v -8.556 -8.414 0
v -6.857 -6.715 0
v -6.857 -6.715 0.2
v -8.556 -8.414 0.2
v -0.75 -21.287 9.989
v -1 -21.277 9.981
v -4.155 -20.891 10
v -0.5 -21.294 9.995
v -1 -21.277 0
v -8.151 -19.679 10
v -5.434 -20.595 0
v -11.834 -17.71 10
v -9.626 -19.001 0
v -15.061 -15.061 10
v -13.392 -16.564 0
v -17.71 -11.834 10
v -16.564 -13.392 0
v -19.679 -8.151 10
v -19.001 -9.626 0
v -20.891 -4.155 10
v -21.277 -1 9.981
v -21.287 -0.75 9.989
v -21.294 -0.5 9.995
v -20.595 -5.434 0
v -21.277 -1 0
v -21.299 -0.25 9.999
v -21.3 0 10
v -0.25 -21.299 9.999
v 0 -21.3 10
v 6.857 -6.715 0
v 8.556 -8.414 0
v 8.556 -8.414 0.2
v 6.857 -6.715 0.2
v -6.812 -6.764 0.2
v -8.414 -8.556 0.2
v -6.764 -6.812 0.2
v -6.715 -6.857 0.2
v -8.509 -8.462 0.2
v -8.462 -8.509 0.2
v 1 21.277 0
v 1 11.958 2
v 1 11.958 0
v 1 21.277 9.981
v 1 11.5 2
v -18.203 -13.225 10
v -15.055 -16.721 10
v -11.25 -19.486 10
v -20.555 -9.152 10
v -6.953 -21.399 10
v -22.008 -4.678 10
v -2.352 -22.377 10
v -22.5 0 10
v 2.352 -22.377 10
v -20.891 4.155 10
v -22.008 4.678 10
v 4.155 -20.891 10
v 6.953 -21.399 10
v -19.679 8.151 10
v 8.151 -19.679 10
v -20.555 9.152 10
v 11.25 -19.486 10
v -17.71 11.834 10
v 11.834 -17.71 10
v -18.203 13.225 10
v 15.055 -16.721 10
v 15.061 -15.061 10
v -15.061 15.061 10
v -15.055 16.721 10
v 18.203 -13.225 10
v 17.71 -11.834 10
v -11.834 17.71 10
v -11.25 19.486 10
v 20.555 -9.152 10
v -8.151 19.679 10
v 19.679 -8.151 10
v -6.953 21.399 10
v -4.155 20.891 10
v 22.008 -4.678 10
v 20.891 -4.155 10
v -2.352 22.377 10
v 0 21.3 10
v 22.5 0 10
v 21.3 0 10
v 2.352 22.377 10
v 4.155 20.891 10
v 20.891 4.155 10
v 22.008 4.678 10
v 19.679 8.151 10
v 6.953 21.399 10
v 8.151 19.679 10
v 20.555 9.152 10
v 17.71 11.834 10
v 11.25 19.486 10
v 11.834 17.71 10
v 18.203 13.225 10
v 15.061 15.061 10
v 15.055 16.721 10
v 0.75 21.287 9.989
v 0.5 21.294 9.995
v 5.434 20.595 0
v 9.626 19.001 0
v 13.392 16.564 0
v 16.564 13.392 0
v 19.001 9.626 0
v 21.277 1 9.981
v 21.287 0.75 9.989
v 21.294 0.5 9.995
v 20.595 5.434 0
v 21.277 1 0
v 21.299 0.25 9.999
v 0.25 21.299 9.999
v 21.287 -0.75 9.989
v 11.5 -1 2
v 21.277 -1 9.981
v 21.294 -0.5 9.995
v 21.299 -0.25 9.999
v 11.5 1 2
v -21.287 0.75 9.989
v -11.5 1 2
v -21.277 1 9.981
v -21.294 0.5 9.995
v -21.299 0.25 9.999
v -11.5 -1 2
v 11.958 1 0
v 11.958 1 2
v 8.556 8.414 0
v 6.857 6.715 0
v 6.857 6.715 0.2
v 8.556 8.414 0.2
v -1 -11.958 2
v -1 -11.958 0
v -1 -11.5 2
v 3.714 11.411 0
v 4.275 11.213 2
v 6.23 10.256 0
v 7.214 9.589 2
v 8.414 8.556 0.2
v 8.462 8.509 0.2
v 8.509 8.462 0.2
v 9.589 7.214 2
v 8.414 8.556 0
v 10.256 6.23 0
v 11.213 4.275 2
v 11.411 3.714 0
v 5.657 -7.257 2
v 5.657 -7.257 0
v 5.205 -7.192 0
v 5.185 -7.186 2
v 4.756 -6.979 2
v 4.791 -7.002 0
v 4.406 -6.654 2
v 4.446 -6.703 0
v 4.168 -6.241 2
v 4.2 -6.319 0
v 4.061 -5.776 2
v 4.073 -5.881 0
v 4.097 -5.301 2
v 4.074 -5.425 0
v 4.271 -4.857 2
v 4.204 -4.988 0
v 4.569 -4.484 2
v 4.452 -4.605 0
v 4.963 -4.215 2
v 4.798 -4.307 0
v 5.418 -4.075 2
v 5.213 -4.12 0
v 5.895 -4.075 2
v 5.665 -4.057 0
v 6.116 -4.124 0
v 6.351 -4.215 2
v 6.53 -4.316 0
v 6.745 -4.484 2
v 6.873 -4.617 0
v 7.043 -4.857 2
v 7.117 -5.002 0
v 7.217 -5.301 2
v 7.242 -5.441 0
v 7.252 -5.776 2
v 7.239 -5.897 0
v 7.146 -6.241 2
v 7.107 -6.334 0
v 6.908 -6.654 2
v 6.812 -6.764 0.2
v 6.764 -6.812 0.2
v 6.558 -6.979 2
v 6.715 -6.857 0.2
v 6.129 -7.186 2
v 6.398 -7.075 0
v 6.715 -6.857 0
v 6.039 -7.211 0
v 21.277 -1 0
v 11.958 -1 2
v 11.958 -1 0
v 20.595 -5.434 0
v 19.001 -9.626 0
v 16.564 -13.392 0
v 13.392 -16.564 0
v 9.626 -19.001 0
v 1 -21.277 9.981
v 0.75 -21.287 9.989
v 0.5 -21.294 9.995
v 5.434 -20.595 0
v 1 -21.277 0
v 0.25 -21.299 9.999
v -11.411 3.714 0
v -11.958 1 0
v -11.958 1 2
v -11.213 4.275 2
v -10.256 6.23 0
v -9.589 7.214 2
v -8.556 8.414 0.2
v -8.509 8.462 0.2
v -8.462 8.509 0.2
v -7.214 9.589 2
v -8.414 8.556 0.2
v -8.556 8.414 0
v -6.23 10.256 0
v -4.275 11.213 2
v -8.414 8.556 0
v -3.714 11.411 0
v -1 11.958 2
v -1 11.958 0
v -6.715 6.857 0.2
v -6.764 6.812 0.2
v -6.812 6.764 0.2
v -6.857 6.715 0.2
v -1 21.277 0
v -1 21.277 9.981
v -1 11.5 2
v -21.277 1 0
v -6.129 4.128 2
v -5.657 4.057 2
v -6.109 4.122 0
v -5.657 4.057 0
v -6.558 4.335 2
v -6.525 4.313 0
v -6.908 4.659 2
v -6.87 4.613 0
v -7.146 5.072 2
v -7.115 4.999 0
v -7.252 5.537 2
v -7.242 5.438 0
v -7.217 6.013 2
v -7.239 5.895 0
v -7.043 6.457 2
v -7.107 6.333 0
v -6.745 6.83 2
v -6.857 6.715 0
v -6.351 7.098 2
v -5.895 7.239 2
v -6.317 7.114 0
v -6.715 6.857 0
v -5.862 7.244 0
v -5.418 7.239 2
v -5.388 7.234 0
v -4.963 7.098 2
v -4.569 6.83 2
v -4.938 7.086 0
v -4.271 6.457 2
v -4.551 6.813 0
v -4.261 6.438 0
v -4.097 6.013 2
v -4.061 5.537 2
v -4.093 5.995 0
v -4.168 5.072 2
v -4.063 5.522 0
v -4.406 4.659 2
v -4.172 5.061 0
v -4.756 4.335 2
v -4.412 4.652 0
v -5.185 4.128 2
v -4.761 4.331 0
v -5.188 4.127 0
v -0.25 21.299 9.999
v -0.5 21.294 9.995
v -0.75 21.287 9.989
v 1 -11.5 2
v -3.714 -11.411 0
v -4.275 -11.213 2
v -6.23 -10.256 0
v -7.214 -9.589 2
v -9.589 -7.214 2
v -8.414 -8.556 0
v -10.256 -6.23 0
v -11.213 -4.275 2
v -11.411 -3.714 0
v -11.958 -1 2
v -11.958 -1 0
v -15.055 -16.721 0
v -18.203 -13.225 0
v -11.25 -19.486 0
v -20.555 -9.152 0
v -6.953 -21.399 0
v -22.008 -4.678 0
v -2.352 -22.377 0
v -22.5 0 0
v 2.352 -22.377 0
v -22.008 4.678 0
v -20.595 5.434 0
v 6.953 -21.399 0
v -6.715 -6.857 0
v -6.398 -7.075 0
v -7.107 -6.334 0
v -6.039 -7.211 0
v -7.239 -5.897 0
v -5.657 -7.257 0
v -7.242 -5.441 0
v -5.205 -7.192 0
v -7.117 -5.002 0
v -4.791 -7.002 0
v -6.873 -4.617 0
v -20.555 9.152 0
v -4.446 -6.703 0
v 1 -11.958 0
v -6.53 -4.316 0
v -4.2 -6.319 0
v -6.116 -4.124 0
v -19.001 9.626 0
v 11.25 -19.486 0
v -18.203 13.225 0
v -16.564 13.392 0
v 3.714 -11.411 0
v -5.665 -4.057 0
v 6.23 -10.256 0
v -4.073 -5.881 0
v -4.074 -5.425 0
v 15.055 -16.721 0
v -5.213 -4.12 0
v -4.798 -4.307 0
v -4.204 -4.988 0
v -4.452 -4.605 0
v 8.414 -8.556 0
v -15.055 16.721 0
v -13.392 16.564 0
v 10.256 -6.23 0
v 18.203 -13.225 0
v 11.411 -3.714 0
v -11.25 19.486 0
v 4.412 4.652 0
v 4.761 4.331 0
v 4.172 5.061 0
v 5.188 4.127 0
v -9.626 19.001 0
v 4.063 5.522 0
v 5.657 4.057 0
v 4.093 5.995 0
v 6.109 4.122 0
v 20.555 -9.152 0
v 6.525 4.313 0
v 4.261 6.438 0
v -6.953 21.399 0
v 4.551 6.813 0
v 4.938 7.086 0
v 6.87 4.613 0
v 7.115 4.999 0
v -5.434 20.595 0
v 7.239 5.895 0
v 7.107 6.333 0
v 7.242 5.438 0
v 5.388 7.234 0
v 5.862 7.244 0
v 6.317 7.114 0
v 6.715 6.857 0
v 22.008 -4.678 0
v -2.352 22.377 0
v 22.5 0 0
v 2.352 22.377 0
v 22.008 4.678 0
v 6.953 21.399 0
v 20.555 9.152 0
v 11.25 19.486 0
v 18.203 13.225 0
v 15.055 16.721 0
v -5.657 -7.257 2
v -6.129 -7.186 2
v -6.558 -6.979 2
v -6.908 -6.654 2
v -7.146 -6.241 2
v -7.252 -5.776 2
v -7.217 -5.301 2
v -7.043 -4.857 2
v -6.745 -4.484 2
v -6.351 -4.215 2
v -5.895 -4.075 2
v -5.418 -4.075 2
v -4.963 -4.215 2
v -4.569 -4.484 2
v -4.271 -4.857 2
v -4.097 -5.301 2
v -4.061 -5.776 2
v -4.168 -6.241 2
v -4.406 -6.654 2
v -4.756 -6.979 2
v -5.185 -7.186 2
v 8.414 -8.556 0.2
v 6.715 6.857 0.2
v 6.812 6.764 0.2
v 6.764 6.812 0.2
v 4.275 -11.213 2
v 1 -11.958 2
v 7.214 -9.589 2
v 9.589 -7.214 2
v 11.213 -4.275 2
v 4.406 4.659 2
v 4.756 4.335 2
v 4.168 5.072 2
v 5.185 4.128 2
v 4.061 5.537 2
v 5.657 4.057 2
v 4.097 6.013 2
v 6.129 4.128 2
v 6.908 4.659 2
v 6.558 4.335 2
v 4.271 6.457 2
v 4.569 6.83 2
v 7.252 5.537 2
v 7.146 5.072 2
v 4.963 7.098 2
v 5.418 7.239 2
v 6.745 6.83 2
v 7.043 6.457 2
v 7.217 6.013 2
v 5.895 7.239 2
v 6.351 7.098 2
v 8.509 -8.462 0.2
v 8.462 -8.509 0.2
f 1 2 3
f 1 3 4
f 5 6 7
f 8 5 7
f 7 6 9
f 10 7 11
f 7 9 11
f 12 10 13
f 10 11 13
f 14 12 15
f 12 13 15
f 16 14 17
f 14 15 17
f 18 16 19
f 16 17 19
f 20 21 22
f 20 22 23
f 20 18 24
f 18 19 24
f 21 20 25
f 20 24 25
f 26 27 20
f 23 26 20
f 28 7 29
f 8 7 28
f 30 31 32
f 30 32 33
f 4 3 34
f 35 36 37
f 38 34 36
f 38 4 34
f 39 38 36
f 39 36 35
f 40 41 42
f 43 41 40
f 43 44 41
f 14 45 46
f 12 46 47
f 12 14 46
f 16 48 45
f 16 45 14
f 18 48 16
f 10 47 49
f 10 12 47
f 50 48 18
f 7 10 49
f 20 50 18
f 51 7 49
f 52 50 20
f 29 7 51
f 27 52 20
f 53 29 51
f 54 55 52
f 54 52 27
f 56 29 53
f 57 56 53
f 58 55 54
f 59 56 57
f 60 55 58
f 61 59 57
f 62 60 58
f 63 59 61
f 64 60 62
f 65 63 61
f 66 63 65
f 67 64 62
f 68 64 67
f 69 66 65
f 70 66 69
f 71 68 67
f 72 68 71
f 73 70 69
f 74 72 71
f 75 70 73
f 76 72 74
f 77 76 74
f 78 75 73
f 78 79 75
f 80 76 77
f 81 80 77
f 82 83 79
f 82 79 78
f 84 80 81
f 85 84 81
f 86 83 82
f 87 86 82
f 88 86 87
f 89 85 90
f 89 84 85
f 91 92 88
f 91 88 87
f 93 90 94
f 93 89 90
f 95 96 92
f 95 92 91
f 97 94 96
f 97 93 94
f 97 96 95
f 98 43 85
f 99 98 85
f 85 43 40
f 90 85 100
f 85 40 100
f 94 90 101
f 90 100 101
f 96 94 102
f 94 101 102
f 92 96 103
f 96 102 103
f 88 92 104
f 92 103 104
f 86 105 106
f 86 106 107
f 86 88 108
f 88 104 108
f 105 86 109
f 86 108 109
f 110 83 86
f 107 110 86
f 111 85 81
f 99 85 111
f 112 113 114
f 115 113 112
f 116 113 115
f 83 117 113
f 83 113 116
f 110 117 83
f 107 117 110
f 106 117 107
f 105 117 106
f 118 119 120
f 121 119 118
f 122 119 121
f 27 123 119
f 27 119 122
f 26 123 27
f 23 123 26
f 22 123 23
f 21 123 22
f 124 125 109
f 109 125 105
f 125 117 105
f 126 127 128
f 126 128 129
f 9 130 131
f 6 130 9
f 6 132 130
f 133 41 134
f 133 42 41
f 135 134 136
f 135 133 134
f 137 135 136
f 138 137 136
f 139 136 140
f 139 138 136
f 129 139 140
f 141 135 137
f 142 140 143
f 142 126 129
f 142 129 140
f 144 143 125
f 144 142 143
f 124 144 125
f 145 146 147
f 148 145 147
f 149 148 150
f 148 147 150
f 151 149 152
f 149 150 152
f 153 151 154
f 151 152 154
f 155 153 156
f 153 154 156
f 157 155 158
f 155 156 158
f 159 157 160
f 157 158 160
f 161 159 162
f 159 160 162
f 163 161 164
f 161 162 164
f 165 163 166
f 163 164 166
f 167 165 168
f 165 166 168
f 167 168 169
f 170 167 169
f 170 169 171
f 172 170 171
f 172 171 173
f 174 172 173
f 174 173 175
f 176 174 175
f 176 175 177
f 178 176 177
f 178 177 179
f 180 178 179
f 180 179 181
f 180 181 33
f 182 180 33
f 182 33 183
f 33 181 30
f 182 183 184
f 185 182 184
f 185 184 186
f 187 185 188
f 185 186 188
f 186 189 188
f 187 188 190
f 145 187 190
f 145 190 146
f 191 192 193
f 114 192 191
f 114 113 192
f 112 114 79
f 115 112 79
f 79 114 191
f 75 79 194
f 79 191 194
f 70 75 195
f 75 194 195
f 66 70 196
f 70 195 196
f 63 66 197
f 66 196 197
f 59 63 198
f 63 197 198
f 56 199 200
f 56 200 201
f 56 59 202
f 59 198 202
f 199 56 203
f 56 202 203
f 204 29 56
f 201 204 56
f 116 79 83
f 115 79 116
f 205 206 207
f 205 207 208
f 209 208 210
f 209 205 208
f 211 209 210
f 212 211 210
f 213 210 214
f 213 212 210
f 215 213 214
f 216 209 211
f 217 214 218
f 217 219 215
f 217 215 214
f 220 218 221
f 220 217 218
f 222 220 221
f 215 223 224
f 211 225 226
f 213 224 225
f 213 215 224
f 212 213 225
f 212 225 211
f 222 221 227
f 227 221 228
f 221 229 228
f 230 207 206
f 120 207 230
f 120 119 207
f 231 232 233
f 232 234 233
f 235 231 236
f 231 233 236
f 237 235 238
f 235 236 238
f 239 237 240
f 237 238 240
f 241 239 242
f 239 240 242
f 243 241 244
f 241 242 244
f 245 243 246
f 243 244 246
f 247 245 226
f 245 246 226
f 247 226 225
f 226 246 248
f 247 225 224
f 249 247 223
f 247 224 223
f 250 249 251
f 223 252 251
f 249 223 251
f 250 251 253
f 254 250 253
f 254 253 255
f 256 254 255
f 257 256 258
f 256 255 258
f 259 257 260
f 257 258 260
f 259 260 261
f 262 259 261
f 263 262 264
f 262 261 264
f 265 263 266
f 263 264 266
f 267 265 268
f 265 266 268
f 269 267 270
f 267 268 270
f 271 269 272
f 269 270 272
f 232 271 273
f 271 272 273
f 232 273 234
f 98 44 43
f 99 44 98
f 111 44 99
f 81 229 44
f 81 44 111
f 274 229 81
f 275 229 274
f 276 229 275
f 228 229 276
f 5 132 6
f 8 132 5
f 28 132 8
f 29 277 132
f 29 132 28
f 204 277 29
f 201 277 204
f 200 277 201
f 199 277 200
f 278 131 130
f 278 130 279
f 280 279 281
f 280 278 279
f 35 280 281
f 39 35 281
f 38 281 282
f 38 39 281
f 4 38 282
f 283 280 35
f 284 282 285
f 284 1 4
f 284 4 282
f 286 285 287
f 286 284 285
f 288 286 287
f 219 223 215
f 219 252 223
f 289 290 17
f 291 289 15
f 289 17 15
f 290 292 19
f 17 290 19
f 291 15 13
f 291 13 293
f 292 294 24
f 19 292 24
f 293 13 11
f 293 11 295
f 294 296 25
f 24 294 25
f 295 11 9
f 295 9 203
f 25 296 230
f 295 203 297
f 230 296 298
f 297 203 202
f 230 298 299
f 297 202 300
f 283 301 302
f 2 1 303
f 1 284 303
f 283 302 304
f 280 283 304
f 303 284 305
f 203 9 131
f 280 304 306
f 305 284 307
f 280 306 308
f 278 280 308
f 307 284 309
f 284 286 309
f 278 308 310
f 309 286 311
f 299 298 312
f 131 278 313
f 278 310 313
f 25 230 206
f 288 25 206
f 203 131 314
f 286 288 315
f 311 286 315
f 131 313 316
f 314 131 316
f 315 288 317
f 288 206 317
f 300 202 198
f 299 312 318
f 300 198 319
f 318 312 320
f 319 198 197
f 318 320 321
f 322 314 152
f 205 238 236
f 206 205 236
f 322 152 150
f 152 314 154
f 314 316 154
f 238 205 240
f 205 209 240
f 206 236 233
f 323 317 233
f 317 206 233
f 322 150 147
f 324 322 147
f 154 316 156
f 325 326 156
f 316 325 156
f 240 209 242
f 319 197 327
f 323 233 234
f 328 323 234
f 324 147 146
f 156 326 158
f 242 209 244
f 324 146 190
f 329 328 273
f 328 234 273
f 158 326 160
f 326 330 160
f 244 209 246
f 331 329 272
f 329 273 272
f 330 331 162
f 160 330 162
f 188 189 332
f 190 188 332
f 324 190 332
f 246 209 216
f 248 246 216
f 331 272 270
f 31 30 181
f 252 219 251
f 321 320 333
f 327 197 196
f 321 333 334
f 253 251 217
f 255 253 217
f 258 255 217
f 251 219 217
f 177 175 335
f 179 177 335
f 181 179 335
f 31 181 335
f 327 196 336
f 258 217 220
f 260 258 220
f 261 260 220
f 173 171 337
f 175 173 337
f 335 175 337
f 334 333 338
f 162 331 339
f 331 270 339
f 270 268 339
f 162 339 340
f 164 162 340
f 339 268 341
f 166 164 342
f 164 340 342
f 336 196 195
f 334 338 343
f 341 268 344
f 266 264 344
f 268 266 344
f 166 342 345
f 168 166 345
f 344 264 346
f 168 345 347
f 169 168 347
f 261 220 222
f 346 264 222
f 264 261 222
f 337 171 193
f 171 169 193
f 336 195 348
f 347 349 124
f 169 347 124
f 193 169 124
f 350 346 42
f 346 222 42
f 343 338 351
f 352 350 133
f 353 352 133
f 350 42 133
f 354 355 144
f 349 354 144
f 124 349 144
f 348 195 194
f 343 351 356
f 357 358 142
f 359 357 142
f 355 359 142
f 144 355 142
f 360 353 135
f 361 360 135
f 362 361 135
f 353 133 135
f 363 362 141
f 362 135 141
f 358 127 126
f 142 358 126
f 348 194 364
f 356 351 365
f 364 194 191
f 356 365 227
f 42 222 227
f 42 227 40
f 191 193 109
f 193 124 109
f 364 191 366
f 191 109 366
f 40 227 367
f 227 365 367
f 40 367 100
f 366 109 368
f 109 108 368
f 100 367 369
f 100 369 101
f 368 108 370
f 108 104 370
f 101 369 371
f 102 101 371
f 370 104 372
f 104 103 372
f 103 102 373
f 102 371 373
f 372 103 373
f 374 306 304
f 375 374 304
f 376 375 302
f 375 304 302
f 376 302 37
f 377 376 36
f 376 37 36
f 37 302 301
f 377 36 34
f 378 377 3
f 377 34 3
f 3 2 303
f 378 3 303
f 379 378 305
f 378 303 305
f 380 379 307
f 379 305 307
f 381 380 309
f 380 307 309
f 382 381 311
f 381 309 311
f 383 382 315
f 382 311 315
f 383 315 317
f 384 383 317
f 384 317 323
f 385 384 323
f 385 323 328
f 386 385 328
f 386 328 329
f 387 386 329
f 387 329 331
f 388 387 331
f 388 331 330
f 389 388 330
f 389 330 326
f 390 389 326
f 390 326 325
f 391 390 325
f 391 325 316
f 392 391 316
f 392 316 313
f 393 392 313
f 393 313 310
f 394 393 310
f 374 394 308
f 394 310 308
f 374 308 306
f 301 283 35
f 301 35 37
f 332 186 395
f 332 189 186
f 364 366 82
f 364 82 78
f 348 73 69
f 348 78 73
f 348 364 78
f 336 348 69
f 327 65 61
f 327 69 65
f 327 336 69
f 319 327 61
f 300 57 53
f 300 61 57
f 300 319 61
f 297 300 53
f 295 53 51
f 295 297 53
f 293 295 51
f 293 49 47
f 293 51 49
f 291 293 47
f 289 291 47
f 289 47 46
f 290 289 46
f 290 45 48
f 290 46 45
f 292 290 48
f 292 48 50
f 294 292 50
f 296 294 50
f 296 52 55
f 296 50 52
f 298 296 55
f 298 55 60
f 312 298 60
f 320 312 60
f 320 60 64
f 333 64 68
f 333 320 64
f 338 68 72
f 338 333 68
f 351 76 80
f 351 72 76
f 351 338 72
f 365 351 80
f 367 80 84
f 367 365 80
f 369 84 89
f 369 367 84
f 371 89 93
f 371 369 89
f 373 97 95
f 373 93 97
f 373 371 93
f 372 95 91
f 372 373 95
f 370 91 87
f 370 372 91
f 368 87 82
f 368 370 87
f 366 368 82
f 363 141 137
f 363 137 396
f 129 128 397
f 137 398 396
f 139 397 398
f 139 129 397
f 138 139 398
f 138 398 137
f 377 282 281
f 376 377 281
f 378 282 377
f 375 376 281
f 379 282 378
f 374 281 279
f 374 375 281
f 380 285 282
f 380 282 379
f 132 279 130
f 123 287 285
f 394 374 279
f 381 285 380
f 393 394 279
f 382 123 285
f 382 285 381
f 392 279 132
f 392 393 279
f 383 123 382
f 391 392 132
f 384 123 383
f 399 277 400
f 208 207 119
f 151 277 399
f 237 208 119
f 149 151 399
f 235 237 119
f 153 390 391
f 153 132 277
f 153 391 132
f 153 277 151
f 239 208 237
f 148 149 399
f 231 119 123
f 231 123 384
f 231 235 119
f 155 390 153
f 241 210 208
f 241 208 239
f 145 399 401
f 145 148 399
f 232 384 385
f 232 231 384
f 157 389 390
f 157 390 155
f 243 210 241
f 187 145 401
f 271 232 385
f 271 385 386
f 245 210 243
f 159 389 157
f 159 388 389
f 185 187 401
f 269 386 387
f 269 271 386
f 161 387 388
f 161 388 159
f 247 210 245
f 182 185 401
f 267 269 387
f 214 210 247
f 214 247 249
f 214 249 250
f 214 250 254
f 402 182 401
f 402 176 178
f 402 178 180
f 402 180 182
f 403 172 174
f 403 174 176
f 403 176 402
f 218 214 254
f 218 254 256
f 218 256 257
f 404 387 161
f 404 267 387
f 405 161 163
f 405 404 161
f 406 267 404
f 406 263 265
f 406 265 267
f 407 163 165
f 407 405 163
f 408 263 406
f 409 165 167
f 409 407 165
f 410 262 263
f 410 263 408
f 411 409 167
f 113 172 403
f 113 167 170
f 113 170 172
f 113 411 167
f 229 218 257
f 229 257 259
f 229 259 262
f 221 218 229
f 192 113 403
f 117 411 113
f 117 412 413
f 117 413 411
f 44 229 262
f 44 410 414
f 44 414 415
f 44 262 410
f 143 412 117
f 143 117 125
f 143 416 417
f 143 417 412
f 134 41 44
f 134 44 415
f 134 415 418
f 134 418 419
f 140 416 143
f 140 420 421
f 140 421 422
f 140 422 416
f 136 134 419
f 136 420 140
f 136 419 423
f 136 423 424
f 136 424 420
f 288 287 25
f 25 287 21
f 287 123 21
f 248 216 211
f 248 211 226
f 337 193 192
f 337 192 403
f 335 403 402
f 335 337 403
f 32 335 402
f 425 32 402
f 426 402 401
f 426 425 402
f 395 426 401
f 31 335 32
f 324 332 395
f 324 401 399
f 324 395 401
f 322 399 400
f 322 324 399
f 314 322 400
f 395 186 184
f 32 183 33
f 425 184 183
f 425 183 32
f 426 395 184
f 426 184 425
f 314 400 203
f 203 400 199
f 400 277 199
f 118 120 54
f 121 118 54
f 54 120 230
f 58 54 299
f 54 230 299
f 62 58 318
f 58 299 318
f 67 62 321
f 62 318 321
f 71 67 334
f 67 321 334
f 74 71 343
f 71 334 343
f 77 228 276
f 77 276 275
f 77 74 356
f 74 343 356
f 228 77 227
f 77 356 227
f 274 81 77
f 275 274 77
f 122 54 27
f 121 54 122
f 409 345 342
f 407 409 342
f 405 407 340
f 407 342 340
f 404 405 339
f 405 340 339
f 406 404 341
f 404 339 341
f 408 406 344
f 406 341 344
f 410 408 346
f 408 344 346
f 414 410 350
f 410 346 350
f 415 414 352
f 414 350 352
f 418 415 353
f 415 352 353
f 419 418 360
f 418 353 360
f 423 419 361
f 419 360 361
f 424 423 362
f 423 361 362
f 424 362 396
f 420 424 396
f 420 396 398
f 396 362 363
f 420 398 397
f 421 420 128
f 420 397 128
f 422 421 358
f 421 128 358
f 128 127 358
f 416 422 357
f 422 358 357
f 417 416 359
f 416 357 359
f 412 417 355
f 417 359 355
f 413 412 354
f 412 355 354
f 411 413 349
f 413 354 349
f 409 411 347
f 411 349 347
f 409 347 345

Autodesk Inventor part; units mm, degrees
ref_plane "YZ Plane" through (0, 0, 0) normal (1, 0, 0) x (0, 1, 0)
ref_plane "XZ Plane" through (0, 0, 0) normal (0, 1, 0) x (-1, 0, 0)
ref_plane "XY Plane" through (0, 0, 0) normal (0, 0, 1) x (1, 0, 0)
sketch "スケッチ1" plane through (0, 0, 0) normal (0, 0, 1) x (1, 0, 0)
  circle A0 centre (0, 0) radius 12
  dimension "HUB_DIA" = 24
extrude "ハブ" add sketch "スケッチ1" along normal blind 2
sketch "スケッチ2" plane through (0, 0, 0) normal (0, 0, 1) x (1, 0, 0)
  circle A0 centre (0, 0) radius 22.5
  circle A1 centre (0, 0) radius 21.3
  dimension "DIA" = 45
  dimension "RIM_THIN" = 1.2
extrude "リム" add sketch "スケッチ2" along normal blind 10
sketch "スケッチ5" plane through (0, 0, 0) normal (1, 0, 0) x (0, 1, 0)
  line L0 (21.3, 10) -> (21.3, 0) projected
  line L1 (21.3, 10) -> (21.3, 0)
  line L2 (21.3, 0) -> (11.5, 0)
  line L3 (22.5, 0) -> (-22.5, 0) projected
  line L4 (11.5, 0) -> (11.5, 2)
  line L5 (11.5, 2) -> (21.3, 10)
  line L6 (12, 2) -> (-12, 2) projected
  point P0 (0, 0)
  point P1 (0, 0)
  dimension "d10" = 11.5
extrude "スポーク" add sketch "スケッチ5" along normal mid plane 2
pattern_circular "円形状パターン1" count 4 over 360 about axis through (0, 0, -10) along (0, 0, 1) of "スポーク"
sketch "スケッチ6" plane through (0, 0, 2) normal (0, 0, 1) x (1, 0, 0)
  circle A0 centre (0, 0) radius 8 construction
  line L0 (-13.4189, -13.4189) -> (13.4189, 13.4189) construction
  line L1 (-15.0493, 15.0493) -> (15.0493, -15.0493) construction
  line L2 (-16.6434, 0) -> (16.6434, 0) construction
  point P0 (5.6569, 5.6569)
  point P1 (-5.6569, 5.6569)
  point P2 (-5.6569, -5.6569)
  point P3 (5.6569, -5.6569)
  dimension "d16" = 16
  dimension "d17" = 45
  dimension "d18" = 45
hole "フランジ取付穴" at (5.6569, 5.6569, 2) at (-5.6569, 5.6569, 2) at (-5.6569, -5.6569, 2) at (5.6569, -5.6569, 2) direction (0, 0, -1) diameter 3.2 end through all
sketch "スケッチ8" plane through (0, 0, 0) normal (0, 0, -1) x (-1, 0, 0)
  circle A0 centre (5.6569, 5.6569) radius 1.6 construction
  line L0 (5.6569, 5.6569) -> (10.4286, 10.4286) construction
  line L1 (5.6569, 5.6569) -> (12.4051, 5.6569) construction
  line L2 (5.7276, 5.5861) -> (5.5861, 5.7276)
  line L3 (5.5861, 5.7276) -> (11.243, 11.3844)
  line L4 (11.243, 11.3844) -> (11.3844, 11.243)
  line L5 (11.3844, 11.243) -> (5.7276, 5.5861)
  point P0 (0, 0)
  dimension "d32" = 45
  dimension "d33" = 8
  dimension "d34" = 0.2
extrude "1層目をきれいに出力する溝" cut sketch "スケッチ8" against normal blind 0.2
pattern_circular "円形状パターン2" count 4 over 360 about axis through (0, 0, -10) along (0, 0, 1) of "1層目をきれいに出力する溝"
equation "\"d18\" = d17"
properties part number "Wheel-D45A"
